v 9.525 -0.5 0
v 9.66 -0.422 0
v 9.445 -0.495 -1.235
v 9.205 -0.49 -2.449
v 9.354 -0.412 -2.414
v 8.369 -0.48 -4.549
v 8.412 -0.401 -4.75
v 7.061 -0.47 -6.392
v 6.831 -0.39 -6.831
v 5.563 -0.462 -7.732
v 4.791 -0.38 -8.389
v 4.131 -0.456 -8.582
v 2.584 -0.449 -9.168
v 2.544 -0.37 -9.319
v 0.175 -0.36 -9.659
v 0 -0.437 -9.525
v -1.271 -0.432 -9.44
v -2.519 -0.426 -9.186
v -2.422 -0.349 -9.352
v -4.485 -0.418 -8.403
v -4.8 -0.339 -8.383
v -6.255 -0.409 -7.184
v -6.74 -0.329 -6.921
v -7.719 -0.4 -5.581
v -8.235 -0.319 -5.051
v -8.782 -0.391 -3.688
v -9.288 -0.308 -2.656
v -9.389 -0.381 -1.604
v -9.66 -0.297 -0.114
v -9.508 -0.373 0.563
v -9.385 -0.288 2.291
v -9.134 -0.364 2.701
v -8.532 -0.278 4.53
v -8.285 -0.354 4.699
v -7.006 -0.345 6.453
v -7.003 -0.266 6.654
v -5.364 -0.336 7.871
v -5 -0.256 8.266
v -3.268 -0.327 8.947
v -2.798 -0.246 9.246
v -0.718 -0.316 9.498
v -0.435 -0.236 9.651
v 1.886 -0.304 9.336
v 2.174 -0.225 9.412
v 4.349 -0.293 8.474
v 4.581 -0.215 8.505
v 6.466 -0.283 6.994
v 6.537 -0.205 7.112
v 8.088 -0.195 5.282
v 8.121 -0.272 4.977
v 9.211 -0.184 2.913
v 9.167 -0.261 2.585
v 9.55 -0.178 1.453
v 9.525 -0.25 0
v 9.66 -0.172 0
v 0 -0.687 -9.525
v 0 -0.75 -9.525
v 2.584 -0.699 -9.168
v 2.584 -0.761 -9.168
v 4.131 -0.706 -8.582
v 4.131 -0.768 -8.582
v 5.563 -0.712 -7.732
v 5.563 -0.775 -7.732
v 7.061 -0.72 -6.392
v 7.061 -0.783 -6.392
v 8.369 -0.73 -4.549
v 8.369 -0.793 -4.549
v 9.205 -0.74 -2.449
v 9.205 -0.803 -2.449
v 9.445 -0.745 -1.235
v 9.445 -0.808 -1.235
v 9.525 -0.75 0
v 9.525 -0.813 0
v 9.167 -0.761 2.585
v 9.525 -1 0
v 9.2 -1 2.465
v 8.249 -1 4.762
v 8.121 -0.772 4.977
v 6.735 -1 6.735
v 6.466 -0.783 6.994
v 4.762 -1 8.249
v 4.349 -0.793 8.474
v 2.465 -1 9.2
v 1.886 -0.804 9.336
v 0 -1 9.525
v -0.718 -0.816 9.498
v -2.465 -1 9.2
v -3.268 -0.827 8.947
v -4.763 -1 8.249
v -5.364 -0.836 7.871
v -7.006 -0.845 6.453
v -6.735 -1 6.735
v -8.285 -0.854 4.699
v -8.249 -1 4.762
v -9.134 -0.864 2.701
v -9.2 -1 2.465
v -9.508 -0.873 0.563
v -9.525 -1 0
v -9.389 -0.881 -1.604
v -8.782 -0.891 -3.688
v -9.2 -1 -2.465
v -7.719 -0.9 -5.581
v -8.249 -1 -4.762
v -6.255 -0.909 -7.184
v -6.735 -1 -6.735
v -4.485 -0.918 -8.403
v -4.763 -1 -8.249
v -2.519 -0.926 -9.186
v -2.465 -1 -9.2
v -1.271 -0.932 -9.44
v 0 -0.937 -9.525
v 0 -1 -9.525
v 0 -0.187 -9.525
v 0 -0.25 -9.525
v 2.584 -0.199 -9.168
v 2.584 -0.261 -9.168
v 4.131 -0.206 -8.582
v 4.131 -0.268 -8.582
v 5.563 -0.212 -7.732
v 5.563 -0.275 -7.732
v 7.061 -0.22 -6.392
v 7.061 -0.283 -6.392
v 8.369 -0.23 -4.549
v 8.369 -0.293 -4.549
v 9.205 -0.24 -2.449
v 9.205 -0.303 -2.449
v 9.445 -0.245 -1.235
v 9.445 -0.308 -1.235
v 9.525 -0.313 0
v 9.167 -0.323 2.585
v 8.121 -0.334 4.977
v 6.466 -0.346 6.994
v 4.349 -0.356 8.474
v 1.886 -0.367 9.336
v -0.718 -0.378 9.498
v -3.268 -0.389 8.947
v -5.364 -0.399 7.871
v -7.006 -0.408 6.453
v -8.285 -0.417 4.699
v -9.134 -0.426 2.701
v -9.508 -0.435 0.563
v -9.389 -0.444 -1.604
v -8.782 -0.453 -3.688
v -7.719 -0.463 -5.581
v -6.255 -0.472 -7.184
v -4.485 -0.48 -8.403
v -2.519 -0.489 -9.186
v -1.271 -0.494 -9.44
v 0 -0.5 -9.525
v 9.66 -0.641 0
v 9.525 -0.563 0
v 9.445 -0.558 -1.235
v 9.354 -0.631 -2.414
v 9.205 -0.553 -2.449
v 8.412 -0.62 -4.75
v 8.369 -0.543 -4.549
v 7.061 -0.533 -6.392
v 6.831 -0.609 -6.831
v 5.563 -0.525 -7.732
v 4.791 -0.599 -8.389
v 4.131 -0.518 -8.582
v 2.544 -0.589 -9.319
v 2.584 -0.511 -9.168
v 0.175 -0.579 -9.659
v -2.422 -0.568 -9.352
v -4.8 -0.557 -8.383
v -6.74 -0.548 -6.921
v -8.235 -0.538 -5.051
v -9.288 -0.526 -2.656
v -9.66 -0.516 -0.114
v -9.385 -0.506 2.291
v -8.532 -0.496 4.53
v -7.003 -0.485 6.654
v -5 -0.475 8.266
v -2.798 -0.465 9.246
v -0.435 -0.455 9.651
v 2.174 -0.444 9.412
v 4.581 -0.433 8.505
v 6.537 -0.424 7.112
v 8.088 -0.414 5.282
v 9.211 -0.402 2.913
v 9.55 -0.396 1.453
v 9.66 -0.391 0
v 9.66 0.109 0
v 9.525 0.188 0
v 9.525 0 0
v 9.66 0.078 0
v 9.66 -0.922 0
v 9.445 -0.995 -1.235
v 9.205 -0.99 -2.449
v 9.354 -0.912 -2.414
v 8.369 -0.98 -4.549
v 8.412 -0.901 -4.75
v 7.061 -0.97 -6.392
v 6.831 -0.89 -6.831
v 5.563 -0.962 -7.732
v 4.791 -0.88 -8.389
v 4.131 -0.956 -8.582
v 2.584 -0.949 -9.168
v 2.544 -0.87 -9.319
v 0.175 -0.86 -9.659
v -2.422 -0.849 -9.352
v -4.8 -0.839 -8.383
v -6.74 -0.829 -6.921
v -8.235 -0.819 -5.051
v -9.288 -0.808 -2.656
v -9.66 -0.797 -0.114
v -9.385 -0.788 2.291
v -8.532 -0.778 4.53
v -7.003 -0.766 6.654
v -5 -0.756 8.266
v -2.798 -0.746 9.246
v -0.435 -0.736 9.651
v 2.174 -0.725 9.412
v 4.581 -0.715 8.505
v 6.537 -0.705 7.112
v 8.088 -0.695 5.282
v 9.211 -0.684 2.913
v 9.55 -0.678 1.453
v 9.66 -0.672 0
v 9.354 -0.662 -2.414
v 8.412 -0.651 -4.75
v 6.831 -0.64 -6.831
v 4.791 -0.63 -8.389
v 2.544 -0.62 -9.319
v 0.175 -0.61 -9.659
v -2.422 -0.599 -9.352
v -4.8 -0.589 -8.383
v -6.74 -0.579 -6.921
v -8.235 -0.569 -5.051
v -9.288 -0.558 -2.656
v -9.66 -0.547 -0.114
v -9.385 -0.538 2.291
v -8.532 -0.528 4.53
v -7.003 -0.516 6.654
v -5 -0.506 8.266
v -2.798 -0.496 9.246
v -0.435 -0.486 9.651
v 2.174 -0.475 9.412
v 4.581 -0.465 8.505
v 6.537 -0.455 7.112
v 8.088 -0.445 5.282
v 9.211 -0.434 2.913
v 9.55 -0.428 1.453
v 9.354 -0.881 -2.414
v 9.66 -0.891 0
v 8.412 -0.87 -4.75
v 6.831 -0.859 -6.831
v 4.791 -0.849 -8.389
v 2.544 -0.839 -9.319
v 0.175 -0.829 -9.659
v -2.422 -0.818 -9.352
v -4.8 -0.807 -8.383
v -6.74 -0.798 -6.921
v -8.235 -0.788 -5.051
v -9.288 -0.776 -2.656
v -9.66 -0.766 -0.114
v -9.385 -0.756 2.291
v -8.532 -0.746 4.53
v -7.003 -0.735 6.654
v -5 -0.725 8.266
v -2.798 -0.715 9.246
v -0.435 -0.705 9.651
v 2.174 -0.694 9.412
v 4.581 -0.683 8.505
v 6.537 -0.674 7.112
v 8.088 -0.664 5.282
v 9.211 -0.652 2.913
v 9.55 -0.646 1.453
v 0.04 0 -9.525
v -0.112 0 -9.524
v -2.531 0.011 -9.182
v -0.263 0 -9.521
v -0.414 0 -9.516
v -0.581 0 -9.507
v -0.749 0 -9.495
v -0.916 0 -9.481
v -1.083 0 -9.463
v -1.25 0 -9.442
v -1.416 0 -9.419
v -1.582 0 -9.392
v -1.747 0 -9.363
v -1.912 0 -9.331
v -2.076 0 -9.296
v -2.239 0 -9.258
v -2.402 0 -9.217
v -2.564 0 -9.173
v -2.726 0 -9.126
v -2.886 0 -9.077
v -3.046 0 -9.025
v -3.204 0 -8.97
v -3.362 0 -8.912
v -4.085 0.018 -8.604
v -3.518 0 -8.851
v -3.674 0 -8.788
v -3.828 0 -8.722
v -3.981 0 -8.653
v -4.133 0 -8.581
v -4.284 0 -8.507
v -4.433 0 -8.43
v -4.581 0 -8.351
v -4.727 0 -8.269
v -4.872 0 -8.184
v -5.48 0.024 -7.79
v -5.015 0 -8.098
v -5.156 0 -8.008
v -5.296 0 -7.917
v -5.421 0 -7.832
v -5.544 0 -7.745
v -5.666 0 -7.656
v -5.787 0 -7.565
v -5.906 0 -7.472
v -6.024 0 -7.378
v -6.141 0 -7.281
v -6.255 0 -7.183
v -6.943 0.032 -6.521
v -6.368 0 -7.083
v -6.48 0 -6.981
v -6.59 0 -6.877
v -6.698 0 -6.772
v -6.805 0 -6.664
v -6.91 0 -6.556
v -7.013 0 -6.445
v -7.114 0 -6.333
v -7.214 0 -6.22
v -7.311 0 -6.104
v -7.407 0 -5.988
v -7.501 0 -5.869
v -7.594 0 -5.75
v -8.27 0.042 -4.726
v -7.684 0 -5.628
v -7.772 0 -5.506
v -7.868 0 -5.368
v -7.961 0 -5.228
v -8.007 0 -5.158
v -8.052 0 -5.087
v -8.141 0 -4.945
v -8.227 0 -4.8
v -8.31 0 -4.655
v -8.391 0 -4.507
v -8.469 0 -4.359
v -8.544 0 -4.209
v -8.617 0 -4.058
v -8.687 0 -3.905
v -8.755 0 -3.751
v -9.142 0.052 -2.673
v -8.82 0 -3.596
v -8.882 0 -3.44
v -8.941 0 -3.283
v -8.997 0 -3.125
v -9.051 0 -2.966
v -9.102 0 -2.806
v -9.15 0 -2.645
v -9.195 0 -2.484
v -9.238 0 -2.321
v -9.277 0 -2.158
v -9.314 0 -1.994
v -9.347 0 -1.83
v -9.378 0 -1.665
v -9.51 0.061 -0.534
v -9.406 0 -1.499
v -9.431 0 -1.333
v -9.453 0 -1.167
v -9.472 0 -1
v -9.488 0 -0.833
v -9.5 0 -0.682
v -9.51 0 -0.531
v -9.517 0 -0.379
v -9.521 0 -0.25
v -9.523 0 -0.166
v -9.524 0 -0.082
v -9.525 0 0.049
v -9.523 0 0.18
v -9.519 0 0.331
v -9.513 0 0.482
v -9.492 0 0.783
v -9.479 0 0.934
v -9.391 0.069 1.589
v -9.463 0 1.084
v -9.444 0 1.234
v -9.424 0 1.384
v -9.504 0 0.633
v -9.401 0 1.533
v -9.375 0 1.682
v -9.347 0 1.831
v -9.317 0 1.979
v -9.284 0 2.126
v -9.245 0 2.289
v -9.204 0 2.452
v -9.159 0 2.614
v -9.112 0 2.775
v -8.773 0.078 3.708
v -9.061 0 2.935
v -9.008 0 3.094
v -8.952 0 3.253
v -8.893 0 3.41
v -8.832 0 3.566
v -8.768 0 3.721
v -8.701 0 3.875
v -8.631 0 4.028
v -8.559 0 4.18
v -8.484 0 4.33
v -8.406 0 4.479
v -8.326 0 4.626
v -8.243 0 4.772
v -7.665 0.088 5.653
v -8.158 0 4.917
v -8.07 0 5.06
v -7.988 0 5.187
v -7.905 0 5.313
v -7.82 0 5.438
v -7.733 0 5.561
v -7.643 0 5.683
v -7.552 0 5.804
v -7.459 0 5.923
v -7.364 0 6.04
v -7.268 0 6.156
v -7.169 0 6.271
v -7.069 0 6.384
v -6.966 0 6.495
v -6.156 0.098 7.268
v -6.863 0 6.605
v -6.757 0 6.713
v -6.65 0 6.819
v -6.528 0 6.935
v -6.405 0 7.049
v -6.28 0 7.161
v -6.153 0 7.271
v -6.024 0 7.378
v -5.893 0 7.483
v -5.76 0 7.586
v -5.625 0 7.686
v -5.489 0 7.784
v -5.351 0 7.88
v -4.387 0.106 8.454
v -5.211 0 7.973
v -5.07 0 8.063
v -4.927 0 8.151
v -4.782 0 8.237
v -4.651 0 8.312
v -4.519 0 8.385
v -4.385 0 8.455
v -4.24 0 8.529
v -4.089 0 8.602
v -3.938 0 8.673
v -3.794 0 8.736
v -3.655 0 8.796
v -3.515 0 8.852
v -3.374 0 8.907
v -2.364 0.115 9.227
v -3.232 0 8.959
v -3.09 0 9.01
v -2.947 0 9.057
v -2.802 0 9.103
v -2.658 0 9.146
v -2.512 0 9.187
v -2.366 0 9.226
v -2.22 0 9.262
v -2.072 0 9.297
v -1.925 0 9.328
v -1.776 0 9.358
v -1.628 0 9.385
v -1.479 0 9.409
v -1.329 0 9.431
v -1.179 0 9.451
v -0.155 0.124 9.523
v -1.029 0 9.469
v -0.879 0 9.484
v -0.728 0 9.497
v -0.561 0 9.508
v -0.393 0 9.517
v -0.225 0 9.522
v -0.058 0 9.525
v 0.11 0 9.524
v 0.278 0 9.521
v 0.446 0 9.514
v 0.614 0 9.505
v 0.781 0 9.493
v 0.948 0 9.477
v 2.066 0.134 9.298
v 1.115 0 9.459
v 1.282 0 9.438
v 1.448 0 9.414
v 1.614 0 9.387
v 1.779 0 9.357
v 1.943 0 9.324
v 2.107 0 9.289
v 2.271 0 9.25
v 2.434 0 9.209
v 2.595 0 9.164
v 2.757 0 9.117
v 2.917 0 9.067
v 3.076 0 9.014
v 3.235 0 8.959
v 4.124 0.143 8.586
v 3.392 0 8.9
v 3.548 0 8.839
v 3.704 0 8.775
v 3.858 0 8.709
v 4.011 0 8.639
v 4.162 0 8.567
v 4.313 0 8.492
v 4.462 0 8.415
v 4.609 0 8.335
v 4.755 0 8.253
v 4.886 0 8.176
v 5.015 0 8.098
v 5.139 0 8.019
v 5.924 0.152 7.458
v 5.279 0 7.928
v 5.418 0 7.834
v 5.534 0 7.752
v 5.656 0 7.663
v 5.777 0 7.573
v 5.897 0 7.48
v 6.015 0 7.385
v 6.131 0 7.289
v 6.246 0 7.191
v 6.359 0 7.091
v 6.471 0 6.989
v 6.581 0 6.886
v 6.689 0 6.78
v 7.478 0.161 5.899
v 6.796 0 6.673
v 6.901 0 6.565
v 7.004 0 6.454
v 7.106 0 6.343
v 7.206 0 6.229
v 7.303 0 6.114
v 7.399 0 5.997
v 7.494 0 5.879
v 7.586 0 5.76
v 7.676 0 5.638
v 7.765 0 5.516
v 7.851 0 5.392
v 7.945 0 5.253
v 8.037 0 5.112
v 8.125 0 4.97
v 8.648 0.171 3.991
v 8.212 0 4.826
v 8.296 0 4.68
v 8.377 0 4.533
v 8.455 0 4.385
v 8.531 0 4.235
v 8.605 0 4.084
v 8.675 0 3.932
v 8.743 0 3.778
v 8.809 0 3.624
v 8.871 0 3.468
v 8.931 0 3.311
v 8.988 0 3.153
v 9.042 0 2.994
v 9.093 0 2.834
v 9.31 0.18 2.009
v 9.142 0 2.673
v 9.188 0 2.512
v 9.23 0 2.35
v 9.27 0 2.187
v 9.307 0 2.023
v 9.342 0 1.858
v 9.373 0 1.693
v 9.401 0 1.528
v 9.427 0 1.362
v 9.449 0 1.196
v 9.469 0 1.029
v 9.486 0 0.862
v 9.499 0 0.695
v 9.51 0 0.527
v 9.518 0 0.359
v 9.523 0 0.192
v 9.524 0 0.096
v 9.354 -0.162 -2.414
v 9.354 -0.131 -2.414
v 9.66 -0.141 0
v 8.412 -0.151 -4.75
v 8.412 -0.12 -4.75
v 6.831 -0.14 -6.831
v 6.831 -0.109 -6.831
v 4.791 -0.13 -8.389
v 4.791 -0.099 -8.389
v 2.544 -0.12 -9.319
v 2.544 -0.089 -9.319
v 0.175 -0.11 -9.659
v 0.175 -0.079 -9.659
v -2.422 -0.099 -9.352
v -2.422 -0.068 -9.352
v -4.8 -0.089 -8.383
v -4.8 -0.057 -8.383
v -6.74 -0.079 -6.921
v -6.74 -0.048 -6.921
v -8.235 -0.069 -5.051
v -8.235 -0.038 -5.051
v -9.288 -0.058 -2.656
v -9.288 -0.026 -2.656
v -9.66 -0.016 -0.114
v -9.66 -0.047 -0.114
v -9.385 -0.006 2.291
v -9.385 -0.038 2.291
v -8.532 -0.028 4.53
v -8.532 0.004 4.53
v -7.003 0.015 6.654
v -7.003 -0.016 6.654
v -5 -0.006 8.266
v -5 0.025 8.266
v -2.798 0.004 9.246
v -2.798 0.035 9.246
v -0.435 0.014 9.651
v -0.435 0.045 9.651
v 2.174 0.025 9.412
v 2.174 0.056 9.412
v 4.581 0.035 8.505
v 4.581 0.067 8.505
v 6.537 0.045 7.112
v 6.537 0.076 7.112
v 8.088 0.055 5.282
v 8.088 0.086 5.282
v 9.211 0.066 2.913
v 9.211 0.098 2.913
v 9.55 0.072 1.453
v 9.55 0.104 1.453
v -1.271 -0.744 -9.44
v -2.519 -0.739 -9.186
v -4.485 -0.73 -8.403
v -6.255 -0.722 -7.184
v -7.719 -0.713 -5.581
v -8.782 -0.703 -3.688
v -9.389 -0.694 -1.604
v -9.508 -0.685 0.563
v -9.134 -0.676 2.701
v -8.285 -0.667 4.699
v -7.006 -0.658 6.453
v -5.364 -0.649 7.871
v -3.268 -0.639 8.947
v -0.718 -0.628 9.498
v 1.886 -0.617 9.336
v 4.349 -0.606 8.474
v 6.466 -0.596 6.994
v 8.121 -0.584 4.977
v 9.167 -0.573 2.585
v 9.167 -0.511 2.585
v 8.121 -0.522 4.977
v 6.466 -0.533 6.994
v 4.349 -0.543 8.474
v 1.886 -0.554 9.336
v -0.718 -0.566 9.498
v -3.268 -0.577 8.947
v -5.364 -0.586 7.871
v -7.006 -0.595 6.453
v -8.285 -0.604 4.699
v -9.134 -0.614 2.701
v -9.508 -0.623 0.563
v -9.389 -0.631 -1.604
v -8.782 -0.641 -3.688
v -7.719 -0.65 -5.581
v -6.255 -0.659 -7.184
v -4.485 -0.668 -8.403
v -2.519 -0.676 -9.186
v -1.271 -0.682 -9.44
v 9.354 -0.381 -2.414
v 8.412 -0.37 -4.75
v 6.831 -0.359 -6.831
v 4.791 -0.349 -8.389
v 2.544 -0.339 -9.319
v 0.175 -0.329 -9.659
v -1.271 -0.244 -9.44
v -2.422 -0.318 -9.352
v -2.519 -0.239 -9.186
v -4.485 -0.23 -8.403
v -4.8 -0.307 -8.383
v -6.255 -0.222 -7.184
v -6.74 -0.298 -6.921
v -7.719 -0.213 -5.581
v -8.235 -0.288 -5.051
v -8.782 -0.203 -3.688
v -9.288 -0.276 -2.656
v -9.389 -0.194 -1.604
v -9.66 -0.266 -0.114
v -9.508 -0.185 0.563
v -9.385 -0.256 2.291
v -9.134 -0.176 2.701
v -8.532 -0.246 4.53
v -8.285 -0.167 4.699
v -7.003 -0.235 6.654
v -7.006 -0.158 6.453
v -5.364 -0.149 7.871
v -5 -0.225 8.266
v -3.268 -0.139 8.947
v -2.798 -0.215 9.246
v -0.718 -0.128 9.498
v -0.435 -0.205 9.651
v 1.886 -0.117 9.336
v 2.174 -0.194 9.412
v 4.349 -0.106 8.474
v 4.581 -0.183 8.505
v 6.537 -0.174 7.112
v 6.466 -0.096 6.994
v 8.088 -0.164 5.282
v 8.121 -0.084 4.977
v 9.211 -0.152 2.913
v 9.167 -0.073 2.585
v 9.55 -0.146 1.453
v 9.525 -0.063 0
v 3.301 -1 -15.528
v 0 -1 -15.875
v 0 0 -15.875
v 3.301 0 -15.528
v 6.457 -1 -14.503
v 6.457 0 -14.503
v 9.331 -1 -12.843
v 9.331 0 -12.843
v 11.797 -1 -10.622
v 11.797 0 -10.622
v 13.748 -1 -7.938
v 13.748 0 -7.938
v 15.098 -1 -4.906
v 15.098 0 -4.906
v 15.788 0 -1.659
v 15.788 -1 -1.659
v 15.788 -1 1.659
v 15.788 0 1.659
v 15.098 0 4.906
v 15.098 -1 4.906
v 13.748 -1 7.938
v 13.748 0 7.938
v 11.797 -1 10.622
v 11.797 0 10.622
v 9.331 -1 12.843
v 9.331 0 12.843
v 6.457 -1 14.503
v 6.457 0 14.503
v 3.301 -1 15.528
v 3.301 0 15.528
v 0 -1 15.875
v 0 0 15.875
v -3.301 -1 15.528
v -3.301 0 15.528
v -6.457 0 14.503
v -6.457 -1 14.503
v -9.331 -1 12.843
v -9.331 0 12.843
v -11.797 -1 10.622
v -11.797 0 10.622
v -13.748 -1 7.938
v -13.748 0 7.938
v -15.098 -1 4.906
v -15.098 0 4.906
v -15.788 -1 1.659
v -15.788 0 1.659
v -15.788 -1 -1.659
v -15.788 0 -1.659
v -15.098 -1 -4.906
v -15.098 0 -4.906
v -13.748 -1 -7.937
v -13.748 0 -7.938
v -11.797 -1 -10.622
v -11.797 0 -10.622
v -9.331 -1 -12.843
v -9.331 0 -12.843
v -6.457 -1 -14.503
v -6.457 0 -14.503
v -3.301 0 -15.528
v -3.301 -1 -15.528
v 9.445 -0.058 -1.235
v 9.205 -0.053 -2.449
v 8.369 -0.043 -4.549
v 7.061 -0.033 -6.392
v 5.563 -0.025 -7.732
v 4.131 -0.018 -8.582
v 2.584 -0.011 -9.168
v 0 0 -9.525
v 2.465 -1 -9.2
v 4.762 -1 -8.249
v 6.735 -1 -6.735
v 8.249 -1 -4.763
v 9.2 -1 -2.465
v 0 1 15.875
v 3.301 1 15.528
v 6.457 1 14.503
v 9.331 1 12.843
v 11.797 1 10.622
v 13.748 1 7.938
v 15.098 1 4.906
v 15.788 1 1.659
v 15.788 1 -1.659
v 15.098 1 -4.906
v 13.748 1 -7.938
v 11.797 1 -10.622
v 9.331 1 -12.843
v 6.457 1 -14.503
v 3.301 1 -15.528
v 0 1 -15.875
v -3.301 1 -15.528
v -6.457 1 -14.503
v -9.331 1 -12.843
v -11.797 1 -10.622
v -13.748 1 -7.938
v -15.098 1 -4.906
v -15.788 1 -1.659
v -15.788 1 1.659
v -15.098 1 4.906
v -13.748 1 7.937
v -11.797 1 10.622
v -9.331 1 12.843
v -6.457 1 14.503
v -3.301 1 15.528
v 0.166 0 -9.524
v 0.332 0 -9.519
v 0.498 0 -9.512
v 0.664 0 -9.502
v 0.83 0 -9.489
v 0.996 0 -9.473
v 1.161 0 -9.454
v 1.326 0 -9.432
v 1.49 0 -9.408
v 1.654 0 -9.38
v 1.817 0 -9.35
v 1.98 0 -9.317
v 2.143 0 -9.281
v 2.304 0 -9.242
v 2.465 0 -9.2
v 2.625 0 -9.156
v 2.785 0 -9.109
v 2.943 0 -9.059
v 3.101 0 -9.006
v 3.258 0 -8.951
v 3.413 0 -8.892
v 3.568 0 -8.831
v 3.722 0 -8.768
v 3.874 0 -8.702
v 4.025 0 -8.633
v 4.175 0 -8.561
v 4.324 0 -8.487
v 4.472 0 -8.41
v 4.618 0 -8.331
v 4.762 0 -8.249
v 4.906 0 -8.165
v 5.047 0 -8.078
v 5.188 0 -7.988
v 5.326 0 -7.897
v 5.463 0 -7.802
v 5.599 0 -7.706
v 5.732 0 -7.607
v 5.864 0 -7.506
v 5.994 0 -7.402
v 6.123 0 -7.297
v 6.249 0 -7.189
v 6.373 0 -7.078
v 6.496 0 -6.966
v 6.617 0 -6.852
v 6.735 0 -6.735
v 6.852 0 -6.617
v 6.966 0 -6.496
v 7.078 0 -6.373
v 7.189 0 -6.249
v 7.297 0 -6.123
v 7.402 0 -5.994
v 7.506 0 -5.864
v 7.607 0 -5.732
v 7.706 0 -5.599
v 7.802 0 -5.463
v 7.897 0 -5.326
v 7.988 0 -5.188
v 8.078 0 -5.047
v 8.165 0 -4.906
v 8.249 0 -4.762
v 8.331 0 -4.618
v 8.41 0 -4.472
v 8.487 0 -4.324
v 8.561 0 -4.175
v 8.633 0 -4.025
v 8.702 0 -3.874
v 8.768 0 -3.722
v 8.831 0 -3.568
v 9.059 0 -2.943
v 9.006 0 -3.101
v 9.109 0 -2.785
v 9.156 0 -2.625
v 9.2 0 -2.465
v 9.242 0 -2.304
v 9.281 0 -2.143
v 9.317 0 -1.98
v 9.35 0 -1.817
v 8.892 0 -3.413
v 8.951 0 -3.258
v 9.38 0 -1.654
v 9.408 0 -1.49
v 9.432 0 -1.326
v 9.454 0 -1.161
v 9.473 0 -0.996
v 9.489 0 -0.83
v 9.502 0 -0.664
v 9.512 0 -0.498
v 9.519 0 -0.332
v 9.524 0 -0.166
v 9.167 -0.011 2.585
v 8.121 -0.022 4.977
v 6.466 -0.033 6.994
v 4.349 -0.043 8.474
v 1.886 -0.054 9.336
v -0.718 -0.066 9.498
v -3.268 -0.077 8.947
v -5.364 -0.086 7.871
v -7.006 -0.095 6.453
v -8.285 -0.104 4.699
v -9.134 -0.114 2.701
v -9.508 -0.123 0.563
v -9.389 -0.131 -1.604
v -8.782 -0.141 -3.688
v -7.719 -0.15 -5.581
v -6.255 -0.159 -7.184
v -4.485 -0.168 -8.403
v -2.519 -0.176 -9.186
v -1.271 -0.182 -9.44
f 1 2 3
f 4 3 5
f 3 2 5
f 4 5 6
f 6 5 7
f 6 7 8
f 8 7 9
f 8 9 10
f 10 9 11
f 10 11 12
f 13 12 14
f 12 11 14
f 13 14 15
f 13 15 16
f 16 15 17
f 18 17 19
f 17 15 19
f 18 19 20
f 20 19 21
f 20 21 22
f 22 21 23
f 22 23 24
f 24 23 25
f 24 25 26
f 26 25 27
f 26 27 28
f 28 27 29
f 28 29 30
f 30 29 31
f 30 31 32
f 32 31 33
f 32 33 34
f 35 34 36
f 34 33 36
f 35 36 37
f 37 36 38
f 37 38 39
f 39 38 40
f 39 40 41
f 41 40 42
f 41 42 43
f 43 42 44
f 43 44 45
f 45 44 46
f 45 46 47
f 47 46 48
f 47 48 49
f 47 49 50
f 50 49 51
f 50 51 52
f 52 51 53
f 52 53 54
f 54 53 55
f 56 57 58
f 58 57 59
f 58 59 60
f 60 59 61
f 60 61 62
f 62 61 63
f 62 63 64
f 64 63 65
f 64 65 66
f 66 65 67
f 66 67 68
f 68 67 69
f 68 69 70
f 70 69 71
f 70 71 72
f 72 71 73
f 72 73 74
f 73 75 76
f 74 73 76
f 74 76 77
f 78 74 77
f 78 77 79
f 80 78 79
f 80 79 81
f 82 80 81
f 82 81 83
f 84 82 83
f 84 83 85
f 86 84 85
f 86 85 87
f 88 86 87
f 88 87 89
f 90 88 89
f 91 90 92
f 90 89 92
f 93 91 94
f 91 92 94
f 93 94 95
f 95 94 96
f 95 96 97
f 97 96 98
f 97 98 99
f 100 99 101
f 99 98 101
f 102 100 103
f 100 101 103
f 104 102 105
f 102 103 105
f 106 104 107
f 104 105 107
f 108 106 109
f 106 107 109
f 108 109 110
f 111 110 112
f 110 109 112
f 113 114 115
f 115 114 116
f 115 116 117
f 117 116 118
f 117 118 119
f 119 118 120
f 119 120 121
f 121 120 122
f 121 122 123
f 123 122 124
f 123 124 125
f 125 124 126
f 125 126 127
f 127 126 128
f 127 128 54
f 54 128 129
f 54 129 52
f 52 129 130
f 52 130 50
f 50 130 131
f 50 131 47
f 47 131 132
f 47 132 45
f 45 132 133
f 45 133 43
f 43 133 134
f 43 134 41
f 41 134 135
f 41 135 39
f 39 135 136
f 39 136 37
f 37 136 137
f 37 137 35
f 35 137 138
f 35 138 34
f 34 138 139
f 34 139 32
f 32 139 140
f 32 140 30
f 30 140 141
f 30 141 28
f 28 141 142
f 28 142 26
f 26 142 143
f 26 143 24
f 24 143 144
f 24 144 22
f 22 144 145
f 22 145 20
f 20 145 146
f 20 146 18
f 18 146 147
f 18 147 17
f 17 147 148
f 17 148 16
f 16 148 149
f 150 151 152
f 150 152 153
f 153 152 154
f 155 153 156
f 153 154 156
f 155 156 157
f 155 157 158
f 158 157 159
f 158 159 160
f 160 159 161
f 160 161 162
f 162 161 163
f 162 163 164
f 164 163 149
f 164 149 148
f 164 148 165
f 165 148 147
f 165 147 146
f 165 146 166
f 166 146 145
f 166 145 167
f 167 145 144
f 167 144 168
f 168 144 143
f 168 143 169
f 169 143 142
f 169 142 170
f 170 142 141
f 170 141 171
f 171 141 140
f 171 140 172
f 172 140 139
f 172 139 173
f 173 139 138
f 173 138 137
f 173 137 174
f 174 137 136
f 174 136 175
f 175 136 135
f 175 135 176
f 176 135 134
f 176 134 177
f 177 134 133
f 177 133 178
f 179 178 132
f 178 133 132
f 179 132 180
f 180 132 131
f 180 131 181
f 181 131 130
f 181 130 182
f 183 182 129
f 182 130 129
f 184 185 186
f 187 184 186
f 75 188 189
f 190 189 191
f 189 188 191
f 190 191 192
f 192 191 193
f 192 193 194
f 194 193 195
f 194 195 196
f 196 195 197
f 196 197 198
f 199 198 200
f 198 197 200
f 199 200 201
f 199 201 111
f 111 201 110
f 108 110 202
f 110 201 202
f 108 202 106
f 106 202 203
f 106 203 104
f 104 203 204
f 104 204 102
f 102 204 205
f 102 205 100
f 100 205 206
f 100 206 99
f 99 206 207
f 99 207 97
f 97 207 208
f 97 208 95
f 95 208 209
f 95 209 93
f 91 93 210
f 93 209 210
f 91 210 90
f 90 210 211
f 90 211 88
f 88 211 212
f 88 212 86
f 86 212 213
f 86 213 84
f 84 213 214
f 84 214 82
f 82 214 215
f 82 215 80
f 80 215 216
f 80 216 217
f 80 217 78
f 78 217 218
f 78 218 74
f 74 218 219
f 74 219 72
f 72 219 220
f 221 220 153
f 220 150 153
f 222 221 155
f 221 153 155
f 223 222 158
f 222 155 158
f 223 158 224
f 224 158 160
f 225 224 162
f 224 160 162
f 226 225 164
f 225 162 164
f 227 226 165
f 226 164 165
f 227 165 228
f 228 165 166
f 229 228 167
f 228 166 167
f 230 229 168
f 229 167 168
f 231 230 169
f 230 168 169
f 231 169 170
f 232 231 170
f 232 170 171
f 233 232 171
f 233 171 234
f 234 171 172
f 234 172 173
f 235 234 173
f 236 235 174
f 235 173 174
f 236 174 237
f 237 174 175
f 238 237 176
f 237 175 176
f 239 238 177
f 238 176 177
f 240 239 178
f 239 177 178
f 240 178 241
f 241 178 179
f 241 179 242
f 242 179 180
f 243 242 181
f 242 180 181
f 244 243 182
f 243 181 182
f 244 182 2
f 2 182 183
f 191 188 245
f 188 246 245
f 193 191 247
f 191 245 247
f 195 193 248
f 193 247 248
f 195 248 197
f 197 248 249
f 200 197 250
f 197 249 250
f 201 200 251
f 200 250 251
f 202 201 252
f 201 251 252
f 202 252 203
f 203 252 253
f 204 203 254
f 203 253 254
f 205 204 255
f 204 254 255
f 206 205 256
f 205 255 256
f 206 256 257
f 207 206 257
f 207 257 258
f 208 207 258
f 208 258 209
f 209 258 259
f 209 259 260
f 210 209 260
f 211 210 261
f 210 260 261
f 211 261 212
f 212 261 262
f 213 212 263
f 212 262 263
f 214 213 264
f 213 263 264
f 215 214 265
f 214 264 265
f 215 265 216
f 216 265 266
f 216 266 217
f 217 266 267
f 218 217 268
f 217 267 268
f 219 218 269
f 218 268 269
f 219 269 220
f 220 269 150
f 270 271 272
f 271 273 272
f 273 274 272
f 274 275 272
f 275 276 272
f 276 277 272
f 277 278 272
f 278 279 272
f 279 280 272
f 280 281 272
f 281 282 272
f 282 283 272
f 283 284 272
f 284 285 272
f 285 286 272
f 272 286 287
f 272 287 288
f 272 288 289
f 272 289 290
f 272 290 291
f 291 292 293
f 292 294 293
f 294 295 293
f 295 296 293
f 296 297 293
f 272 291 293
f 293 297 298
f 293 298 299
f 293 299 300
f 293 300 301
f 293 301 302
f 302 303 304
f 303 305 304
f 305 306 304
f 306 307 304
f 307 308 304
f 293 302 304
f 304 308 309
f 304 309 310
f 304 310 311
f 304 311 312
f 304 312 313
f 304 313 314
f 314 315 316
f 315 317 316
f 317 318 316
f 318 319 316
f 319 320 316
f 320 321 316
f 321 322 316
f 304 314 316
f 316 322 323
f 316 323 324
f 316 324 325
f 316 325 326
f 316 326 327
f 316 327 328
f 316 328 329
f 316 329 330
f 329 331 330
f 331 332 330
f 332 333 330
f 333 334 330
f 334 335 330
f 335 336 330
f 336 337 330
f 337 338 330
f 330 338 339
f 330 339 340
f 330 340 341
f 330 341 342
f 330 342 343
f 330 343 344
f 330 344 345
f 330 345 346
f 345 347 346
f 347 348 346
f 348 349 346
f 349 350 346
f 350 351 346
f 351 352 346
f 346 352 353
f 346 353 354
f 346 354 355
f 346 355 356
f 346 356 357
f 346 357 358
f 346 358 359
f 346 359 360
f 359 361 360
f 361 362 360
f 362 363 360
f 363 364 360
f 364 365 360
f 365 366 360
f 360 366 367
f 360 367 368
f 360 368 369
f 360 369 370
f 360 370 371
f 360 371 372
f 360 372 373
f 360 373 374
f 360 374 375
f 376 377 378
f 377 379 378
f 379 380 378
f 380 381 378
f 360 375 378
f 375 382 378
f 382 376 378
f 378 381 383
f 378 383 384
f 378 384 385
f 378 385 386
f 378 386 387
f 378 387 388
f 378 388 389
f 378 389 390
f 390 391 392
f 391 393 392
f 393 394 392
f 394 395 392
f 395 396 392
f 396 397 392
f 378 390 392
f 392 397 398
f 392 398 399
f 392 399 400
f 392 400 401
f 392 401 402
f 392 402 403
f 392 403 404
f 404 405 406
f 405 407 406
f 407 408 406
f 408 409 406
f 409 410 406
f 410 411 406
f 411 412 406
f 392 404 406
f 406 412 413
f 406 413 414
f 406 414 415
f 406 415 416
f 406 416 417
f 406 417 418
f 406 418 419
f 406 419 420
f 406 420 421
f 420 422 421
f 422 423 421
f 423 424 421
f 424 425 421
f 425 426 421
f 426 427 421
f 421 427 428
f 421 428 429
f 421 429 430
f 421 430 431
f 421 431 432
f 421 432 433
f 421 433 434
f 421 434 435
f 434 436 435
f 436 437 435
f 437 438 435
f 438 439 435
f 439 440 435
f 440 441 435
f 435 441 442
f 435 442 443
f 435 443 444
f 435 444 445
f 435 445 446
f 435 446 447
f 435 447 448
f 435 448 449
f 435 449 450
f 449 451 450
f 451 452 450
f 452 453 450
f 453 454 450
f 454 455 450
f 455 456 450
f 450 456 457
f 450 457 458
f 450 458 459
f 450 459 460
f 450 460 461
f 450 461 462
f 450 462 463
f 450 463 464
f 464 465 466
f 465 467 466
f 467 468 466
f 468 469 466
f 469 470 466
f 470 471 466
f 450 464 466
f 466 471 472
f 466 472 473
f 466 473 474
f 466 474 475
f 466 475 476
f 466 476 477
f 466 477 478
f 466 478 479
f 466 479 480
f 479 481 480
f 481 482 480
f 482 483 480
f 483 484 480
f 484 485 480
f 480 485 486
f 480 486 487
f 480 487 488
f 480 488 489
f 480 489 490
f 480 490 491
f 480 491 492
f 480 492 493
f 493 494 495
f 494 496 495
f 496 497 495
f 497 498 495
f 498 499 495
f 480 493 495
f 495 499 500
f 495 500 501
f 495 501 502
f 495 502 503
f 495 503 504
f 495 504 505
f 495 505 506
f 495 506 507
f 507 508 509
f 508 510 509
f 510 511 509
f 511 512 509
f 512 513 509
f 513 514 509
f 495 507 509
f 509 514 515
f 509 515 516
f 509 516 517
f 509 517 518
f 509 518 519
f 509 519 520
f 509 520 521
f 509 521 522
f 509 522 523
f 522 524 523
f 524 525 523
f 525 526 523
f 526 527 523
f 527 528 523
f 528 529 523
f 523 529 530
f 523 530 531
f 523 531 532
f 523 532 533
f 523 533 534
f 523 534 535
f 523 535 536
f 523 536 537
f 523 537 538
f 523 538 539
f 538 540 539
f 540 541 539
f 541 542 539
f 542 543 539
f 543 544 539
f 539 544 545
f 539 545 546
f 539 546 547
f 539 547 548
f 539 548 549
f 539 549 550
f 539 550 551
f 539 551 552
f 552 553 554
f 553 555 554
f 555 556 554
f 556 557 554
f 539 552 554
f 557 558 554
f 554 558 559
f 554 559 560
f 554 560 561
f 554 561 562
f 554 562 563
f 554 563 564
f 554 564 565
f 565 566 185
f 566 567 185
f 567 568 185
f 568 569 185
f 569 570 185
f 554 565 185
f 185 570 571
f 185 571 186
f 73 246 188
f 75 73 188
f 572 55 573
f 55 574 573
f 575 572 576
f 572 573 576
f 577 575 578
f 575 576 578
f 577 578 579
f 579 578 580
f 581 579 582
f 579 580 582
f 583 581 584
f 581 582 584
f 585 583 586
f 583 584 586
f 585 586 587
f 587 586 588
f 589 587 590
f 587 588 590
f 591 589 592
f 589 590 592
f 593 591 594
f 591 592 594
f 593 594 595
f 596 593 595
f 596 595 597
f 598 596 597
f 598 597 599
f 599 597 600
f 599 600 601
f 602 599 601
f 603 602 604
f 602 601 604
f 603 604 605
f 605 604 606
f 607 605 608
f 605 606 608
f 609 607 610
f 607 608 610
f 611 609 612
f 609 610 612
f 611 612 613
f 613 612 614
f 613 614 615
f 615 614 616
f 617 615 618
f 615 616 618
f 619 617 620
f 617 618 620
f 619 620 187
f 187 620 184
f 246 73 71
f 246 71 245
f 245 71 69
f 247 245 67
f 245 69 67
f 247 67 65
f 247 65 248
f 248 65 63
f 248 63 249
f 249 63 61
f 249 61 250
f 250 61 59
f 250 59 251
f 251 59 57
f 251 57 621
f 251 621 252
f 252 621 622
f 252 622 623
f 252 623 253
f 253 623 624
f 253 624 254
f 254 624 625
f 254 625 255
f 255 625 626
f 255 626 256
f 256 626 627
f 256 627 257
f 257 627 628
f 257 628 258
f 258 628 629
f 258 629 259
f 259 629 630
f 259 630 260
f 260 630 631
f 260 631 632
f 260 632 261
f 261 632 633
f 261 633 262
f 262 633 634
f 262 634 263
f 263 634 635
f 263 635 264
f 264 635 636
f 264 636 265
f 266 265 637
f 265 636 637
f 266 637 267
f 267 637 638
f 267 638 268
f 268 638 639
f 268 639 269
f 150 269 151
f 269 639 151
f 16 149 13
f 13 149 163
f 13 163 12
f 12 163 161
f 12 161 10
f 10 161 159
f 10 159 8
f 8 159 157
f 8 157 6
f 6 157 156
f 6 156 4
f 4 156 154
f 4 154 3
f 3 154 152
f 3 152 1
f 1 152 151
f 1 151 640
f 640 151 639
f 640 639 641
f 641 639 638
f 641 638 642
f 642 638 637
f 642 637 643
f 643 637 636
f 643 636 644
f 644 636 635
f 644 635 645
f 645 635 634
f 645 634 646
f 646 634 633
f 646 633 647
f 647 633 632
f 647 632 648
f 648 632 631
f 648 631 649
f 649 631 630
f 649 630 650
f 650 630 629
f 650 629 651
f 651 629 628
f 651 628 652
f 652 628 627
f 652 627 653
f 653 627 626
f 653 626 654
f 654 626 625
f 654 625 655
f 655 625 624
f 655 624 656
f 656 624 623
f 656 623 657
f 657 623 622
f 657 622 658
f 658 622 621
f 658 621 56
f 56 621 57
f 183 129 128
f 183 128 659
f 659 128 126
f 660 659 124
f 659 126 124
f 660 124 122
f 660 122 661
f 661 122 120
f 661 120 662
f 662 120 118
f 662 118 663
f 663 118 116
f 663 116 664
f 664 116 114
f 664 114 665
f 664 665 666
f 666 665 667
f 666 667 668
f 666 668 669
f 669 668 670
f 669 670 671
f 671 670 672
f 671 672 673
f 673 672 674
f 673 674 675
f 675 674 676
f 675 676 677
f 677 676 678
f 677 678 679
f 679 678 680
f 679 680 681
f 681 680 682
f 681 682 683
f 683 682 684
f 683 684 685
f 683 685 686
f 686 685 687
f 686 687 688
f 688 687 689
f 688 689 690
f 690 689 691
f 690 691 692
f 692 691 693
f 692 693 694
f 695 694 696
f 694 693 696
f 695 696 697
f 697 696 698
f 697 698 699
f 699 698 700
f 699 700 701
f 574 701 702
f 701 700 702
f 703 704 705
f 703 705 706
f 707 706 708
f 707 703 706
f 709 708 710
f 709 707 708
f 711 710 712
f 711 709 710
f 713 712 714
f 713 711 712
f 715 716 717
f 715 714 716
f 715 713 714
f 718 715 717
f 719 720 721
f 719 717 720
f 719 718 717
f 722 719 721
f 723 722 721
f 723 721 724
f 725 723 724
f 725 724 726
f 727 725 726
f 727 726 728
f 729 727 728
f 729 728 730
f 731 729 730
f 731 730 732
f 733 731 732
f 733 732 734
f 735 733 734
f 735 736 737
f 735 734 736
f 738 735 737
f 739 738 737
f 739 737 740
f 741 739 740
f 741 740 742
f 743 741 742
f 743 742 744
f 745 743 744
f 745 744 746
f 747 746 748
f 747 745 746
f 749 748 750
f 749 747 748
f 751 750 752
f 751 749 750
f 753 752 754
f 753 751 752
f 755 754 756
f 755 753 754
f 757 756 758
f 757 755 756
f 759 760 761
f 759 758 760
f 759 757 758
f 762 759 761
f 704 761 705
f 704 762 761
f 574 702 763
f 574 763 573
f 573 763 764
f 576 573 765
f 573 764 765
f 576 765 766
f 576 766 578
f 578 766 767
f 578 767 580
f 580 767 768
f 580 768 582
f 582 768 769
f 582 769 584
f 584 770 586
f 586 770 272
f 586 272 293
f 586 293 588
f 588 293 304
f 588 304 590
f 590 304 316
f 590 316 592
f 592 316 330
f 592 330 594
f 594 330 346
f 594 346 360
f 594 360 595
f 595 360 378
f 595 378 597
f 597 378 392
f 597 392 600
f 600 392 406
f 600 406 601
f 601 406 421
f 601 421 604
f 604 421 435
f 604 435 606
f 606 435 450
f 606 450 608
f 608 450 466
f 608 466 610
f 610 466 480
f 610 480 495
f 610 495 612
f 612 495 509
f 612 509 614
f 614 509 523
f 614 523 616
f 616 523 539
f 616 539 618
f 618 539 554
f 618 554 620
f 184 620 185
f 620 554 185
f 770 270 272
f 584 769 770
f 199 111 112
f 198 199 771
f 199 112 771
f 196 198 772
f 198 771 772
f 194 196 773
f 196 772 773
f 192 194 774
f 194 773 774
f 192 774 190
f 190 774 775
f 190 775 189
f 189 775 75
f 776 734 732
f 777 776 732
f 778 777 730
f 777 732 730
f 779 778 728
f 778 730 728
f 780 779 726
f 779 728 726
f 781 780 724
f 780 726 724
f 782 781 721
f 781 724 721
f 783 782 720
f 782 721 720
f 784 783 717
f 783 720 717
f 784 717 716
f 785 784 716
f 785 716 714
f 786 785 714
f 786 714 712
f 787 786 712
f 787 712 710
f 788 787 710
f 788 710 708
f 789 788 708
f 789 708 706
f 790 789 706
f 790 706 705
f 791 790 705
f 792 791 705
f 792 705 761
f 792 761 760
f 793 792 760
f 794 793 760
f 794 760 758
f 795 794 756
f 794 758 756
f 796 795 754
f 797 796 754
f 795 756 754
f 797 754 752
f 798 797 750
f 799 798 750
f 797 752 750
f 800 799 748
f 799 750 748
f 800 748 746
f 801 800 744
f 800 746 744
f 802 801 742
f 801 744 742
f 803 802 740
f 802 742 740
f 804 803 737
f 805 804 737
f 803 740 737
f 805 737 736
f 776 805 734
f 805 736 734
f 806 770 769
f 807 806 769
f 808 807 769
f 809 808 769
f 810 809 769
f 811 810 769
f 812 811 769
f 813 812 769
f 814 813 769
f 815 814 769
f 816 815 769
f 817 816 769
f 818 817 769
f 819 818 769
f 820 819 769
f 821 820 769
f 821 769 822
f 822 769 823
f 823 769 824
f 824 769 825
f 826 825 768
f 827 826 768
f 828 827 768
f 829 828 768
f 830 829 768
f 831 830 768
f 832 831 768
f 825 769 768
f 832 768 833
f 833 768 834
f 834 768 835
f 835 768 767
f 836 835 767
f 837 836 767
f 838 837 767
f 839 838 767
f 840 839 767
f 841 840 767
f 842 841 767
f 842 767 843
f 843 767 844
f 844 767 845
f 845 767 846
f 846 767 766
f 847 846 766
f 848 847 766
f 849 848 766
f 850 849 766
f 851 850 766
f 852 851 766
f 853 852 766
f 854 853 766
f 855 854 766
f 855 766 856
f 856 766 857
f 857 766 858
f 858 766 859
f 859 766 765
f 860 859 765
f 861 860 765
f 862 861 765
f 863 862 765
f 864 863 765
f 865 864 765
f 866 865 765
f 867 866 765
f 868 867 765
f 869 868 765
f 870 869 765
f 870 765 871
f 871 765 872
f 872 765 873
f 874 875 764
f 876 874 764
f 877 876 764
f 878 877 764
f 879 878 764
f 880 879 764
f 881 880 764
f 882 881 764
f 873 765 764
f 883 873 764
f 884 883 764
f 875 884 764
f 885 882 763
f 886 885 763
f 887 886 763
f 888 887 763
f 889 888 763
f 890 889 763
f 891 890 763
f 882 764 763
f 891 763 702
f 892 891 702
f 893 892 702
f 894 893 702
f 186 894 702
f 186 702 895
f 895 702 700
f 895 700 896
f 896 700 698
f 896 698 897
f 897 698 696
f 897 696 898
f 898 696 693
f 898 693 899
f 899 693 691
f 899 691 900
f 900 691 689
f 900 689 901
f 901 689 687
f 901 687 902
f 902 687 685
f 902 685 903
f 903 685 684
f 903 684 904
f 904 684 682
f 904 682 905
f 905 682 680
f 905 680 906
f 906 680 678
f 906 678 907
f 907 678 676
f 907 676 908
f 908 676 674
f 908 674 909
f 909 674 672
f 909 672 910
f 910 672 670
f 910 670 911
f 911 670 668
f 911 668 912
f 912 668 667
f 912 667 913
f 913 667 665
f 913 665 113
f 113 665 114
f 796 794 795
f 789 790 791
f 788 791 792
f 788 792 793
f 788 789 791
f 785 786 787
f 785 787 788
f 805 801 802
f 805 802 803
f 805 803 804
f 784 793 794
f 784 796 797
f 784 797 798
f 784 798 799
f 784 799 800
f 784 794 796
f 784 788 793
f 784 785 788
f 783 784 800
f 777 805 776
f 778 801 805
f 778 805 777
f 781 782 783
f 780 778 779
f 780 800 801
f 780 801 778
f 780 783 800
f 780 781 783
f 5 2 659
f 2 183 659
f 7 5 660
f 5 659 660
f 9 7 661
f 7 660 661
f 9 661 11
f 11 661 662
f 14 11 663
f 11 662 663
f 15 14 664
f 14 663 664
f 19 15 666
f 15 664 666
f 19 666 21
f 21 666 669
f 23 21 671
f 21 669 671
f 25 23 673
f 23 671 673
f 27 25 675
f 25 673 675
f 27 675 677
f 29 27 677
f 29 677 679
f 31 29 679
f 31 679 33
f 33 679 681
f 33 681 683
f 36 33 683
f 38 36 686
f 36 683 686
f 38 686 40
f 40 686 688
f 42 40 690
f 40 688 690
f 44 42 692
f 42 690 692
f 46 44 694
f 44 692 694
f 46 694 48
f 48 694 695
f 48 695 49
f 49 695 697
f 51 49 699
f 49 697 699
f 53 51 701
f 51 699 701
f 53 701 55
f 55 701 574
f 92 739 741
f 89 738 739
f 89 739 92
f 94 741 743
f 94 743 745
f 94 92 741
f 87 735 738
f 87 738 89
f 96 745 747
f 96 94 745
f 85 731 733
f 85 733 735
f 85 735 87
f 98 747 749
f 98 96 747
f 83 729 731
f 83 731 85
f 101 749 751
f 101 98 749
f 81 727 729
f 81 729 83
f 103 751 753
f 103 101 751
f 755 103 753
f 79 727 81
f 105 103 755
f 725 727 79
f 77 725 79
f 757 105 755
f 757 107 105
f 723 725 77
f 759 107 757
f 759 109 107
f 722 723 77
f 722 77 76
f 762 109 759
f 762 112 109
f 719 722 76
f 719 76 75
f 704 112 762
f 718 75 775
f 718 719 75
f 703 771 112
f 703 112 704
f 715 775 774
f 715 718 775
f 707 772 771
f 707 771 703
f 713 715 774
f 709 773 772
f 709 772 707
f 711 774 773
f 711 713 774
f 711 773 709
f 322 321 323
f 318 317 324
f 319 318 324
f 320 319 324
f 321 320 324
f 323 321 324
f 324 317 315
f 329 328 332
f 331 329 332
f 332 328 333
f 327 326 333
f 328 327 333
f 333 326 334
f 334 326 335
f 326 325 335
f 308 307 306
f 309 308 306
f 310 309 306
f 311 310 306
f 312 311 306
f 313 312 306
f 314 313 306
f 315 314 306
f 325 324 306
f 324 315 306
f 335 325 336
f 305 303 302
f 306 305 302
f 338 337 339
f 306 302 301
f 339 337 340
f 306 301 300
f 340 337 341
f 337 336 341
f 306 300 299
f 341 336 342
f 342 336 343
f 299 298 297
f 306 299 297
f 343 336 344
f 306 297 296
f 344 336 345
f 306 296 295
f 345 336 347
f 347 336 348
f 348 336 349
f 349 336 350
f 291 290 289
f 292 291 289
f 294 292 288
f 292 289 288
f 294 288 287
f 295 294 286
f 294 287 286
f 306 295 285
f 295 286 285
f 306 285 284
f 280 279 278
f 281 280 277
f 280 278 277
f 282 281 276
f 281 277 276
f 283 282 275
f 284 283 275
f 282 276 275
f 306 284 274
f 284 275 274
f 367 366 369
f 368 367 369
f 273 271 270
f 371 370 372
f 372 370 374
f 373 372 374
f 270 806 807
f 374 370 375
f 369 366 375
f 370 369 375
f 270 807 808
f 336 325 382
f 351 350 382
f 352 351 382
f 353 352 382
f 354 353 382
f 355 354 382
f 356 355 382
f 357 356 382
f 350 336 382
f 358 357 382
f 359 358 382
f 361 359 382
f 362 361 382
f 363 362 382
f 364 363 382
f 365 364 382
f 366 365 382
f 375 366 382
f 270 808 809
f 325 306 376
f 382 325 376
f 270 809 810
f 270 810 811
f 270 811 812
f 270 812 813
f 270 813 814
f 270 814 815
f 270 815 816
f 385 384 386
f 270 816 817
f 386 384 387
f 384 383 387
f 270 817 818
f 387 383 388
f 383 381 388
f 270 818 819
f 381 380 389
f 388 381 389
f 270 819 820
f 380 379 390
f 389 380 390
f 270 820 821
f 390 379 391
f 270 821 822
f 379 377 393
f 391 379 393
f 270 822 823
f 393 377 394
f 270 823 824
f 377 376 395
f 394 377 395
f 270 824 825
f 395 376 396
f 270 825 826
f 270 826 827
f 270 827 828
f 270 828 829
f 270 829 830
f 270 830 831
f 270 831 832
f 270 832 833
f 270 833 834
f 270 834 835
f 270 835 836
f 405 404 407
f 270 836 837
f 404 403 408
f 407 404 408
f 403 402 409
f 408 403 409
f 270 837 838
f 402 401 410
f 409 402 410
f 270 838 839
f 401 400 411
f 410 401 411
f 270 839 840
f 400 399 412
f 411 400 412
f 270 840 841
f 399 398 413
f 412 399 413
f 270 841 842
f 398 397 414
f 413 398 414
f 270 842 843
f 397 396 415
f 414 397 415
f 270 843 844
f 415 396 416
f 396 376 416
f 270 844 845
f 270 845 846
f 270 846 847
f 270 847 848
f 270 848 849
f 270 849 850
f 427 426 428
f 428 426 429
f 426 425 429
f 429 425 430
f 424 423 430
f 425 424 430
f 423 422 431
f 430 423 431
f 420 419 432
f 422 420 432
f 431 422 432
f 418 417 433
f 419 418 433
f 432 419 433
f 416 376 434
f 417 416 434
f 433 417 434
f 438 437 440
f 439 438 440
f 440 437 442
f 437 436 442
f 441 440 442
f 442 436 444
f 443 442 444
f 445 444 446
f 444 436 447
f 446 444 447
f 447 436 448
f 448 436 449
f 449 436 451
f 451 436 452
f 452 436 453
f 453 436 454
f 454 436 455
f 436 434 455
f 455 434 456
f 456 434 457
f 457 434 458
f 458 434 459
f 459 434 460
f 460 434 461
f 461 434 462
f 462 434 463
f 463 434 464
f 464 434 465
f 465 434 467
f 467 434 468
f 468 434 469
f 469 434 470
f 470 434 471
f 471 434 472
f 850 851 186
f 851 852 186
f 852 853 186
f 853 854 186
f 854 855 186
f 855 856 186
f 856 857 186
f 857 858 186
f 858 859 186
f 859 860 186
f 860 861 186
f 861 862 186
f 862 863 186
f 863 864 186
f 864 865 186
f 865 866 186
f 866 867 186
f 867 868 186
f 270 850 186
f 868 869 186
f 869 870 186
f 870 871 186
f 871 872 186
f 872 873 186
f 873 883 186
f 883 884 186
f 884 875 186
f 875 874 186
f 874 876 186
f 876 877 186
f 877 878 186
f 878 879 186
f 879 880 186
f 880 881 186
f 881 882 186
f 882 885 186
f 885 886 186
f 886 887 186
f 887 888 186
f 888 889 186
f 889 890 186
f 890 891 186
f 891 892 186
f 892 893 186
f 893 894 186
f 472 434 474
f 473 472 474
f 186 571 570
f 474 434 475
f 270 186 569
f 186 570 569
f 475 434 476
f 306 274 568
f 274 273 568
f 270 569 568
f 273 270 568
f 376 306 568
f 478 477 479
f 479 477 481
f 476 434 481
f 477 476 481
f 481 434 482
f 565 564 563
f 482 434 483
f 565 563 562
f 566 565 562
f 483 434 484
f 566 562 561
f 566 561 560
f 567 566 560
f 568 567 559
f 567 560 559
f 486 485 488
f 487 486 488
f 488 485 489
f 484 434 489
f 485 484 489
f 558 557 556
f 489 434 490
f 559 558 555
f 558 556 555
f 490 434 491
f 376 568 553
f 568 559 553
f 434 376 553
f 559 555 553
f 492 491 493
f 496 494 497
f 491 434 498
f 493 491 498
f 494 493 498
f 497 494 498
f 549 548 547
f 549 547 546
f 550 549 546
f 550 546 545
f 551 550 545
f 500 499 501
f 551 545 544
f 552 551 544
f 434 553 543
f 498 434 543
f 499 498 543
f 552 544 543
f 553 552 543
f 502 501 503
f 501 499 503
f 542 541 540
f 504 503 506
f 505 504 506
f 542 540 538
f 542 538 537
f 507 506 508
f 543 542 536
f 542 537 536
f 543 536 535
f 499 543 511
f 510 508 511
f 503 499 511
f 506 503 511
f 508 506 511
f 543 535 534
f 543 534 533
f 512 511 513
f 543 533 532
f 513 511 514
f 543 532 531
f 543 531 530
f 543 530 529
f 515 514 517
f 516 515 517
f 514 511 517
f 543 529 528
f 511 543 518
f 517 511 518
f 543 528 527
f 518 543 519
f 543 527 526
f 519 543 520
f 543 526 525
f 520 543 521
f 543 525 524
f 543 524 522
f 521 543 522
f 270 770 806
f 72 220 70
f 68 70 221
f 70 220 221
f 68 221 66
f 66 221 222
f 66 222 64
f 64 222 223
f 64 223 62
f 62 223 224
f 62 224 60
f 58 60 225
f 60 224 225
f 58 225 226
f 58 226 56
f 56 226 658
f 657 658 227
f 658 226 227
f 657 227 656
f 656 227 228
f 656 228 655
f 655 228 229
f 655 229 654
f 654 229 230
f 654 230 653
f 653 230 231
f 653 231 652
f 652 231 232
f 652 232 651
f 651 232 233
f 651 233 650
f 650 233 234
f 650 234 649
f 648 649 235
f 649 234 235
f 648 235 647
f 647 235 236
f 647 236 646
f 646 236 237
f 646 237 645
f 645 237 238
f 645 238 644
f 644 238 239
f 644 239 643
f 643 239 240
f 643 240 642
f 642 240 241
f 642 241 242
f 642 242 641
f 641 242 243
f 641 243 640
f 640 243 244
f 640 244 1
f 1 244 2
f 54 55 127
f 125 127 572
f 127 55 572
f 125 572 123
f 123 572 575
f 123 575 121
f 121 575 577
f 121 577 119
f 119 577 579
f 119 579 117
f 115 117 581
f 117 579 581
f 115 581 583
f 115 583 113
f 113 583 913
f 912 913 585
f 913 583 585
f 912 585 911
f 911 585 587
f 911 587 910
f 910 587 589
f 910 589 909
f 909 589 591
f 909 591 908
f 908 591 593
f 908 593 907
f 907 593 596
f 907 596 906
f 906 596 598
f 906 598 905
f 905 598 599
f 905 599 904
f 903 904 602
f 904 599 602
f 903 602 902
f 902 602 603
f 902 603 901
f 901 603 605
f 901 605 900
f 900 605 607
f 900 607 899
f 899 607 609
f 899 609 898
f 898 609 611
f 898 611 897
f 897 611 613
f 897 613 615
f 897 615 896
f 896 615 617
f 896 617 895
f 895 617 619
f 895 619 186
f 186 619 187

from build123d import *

# Parameters (mm, degrees)
SKETCH1_R           = 15.875
BOSS_EXTRUDE1_DEPTH = 1
BOSS_EXTRUDE3_START = 1
SKETCH6_R           = 15.875
SKETCH6_R_2         = 9.525
BOSS_EXTRUDE3_DEPTH = 1
THREAD1_PITCH       = 0.25


with BuildPart() as part:
    # Sketch1 → Boss-Extrude1 (new body)
    with BuildSketch(Plane(origin=(0, 0, 0), x_dir=(1, 0, 0), z_dir=(0, 1, 0))):
        with Locations(Location((0, 0, 0), (0, 0, 270))):
            Circle(SKETCH1_R)
    extrude(amount=BOSS_EXTRUDE1_DEPTH)

    # Sketch6 → Boss-Extrude3 (add)
    with BuildSketch(Plane.XZ.offset(BOSS_EXTRUDE3_START)):
        with Locations(Location((0, 0, 0), (0, 0, 270))):
            Circle(SKETCH6_R)
        with Locations(Location((0, 0, 0), (0, 0, 270))):
            Circle(SKETCH6_R_2, mode=Mode.SUBTRACT)
    extrude(amount=-BOSS_EXTRUDE3_DEPTH)

    # Thread1: the profile of Thread Profile1 profile screwed along a right-hand helix of 4 turns, 6 arcs to a turn; built about Z, then put on its axis
    thread1_z = Axis((0, 0, 0), (0, 0, 1))
    thread1_corners = [(9.5247, 0, -0.000173205), (9.660316469, 0, 0.078125), (9.660316469, 0, 0.109375), (9.5247, 0, 0.187673204)]
    with BuildLine(mode=Mode.PRIVATE) as thread1_profile:
        Line(thread1_corners[0], thread1_corners[1])
        Line(thread1_corners[1], thread1_corners[2])
        Line(thread1_corners[2], thread1_corners[3])
        Line(thread1_corners[3], thread1_corners[0])
    thread1_cap = Face(thread1_profile.wire())
    thread1_turn_angles = [0, 30, 60, 90, 120, 150, 180, 210, 240, 270, 300, 330, 360]
    thread1_turn_weights = [1, 0.8660254037844387, 1, 0.8660254037844387, 1, 0.8660254037844387, 1, 0.8660254037844387, 1, 0.8660254037844387, 1, 0.8660254037844387, 1]
    thread1_turn_rails = [Edge.make_bspline([Vector(p[0], p[1], 0).rotate(thread1_z, thread1_turn_angles[k]) / thread1_turn_weights[k] + Vector(0, 0, p[2] + THREAD1_PITCH * thread1_turn_angles[k] / 360) for k in range(13)], [0, 0, 0, 1, 1, 2, 2, 3, 3, 4, 4, 5, 5, 6, 6, 6], 2, thread1_turn_weights) for p in thread1_corners]
    thread1_turn_sides = [Face.make_surface_from_curves(thread1_turn_rails[p[0]], thread1_turn_rails[p[1]]) for p in [(0, 1), (1, 2), (2, 3), (3, 0)]]
    thread1 = Plane(origin=(0, -1, 0), x_dir=(1, 0, 0), z_dir=(0, 1, 0)) * Solid(Shell([*[p.moved(Location((0, 0, THREAD1_PITCH * i))) for i in range(4) for p in thread1_turn_sides], thread1_cap, thread1_cap.rotate(thread1_z, 1440).moved(Location((0, 0, THREAD1_PITCH * 1440 / 360)))]))
    add(thread1, mode=Mode.SUBTRACT)


solid = part.part
